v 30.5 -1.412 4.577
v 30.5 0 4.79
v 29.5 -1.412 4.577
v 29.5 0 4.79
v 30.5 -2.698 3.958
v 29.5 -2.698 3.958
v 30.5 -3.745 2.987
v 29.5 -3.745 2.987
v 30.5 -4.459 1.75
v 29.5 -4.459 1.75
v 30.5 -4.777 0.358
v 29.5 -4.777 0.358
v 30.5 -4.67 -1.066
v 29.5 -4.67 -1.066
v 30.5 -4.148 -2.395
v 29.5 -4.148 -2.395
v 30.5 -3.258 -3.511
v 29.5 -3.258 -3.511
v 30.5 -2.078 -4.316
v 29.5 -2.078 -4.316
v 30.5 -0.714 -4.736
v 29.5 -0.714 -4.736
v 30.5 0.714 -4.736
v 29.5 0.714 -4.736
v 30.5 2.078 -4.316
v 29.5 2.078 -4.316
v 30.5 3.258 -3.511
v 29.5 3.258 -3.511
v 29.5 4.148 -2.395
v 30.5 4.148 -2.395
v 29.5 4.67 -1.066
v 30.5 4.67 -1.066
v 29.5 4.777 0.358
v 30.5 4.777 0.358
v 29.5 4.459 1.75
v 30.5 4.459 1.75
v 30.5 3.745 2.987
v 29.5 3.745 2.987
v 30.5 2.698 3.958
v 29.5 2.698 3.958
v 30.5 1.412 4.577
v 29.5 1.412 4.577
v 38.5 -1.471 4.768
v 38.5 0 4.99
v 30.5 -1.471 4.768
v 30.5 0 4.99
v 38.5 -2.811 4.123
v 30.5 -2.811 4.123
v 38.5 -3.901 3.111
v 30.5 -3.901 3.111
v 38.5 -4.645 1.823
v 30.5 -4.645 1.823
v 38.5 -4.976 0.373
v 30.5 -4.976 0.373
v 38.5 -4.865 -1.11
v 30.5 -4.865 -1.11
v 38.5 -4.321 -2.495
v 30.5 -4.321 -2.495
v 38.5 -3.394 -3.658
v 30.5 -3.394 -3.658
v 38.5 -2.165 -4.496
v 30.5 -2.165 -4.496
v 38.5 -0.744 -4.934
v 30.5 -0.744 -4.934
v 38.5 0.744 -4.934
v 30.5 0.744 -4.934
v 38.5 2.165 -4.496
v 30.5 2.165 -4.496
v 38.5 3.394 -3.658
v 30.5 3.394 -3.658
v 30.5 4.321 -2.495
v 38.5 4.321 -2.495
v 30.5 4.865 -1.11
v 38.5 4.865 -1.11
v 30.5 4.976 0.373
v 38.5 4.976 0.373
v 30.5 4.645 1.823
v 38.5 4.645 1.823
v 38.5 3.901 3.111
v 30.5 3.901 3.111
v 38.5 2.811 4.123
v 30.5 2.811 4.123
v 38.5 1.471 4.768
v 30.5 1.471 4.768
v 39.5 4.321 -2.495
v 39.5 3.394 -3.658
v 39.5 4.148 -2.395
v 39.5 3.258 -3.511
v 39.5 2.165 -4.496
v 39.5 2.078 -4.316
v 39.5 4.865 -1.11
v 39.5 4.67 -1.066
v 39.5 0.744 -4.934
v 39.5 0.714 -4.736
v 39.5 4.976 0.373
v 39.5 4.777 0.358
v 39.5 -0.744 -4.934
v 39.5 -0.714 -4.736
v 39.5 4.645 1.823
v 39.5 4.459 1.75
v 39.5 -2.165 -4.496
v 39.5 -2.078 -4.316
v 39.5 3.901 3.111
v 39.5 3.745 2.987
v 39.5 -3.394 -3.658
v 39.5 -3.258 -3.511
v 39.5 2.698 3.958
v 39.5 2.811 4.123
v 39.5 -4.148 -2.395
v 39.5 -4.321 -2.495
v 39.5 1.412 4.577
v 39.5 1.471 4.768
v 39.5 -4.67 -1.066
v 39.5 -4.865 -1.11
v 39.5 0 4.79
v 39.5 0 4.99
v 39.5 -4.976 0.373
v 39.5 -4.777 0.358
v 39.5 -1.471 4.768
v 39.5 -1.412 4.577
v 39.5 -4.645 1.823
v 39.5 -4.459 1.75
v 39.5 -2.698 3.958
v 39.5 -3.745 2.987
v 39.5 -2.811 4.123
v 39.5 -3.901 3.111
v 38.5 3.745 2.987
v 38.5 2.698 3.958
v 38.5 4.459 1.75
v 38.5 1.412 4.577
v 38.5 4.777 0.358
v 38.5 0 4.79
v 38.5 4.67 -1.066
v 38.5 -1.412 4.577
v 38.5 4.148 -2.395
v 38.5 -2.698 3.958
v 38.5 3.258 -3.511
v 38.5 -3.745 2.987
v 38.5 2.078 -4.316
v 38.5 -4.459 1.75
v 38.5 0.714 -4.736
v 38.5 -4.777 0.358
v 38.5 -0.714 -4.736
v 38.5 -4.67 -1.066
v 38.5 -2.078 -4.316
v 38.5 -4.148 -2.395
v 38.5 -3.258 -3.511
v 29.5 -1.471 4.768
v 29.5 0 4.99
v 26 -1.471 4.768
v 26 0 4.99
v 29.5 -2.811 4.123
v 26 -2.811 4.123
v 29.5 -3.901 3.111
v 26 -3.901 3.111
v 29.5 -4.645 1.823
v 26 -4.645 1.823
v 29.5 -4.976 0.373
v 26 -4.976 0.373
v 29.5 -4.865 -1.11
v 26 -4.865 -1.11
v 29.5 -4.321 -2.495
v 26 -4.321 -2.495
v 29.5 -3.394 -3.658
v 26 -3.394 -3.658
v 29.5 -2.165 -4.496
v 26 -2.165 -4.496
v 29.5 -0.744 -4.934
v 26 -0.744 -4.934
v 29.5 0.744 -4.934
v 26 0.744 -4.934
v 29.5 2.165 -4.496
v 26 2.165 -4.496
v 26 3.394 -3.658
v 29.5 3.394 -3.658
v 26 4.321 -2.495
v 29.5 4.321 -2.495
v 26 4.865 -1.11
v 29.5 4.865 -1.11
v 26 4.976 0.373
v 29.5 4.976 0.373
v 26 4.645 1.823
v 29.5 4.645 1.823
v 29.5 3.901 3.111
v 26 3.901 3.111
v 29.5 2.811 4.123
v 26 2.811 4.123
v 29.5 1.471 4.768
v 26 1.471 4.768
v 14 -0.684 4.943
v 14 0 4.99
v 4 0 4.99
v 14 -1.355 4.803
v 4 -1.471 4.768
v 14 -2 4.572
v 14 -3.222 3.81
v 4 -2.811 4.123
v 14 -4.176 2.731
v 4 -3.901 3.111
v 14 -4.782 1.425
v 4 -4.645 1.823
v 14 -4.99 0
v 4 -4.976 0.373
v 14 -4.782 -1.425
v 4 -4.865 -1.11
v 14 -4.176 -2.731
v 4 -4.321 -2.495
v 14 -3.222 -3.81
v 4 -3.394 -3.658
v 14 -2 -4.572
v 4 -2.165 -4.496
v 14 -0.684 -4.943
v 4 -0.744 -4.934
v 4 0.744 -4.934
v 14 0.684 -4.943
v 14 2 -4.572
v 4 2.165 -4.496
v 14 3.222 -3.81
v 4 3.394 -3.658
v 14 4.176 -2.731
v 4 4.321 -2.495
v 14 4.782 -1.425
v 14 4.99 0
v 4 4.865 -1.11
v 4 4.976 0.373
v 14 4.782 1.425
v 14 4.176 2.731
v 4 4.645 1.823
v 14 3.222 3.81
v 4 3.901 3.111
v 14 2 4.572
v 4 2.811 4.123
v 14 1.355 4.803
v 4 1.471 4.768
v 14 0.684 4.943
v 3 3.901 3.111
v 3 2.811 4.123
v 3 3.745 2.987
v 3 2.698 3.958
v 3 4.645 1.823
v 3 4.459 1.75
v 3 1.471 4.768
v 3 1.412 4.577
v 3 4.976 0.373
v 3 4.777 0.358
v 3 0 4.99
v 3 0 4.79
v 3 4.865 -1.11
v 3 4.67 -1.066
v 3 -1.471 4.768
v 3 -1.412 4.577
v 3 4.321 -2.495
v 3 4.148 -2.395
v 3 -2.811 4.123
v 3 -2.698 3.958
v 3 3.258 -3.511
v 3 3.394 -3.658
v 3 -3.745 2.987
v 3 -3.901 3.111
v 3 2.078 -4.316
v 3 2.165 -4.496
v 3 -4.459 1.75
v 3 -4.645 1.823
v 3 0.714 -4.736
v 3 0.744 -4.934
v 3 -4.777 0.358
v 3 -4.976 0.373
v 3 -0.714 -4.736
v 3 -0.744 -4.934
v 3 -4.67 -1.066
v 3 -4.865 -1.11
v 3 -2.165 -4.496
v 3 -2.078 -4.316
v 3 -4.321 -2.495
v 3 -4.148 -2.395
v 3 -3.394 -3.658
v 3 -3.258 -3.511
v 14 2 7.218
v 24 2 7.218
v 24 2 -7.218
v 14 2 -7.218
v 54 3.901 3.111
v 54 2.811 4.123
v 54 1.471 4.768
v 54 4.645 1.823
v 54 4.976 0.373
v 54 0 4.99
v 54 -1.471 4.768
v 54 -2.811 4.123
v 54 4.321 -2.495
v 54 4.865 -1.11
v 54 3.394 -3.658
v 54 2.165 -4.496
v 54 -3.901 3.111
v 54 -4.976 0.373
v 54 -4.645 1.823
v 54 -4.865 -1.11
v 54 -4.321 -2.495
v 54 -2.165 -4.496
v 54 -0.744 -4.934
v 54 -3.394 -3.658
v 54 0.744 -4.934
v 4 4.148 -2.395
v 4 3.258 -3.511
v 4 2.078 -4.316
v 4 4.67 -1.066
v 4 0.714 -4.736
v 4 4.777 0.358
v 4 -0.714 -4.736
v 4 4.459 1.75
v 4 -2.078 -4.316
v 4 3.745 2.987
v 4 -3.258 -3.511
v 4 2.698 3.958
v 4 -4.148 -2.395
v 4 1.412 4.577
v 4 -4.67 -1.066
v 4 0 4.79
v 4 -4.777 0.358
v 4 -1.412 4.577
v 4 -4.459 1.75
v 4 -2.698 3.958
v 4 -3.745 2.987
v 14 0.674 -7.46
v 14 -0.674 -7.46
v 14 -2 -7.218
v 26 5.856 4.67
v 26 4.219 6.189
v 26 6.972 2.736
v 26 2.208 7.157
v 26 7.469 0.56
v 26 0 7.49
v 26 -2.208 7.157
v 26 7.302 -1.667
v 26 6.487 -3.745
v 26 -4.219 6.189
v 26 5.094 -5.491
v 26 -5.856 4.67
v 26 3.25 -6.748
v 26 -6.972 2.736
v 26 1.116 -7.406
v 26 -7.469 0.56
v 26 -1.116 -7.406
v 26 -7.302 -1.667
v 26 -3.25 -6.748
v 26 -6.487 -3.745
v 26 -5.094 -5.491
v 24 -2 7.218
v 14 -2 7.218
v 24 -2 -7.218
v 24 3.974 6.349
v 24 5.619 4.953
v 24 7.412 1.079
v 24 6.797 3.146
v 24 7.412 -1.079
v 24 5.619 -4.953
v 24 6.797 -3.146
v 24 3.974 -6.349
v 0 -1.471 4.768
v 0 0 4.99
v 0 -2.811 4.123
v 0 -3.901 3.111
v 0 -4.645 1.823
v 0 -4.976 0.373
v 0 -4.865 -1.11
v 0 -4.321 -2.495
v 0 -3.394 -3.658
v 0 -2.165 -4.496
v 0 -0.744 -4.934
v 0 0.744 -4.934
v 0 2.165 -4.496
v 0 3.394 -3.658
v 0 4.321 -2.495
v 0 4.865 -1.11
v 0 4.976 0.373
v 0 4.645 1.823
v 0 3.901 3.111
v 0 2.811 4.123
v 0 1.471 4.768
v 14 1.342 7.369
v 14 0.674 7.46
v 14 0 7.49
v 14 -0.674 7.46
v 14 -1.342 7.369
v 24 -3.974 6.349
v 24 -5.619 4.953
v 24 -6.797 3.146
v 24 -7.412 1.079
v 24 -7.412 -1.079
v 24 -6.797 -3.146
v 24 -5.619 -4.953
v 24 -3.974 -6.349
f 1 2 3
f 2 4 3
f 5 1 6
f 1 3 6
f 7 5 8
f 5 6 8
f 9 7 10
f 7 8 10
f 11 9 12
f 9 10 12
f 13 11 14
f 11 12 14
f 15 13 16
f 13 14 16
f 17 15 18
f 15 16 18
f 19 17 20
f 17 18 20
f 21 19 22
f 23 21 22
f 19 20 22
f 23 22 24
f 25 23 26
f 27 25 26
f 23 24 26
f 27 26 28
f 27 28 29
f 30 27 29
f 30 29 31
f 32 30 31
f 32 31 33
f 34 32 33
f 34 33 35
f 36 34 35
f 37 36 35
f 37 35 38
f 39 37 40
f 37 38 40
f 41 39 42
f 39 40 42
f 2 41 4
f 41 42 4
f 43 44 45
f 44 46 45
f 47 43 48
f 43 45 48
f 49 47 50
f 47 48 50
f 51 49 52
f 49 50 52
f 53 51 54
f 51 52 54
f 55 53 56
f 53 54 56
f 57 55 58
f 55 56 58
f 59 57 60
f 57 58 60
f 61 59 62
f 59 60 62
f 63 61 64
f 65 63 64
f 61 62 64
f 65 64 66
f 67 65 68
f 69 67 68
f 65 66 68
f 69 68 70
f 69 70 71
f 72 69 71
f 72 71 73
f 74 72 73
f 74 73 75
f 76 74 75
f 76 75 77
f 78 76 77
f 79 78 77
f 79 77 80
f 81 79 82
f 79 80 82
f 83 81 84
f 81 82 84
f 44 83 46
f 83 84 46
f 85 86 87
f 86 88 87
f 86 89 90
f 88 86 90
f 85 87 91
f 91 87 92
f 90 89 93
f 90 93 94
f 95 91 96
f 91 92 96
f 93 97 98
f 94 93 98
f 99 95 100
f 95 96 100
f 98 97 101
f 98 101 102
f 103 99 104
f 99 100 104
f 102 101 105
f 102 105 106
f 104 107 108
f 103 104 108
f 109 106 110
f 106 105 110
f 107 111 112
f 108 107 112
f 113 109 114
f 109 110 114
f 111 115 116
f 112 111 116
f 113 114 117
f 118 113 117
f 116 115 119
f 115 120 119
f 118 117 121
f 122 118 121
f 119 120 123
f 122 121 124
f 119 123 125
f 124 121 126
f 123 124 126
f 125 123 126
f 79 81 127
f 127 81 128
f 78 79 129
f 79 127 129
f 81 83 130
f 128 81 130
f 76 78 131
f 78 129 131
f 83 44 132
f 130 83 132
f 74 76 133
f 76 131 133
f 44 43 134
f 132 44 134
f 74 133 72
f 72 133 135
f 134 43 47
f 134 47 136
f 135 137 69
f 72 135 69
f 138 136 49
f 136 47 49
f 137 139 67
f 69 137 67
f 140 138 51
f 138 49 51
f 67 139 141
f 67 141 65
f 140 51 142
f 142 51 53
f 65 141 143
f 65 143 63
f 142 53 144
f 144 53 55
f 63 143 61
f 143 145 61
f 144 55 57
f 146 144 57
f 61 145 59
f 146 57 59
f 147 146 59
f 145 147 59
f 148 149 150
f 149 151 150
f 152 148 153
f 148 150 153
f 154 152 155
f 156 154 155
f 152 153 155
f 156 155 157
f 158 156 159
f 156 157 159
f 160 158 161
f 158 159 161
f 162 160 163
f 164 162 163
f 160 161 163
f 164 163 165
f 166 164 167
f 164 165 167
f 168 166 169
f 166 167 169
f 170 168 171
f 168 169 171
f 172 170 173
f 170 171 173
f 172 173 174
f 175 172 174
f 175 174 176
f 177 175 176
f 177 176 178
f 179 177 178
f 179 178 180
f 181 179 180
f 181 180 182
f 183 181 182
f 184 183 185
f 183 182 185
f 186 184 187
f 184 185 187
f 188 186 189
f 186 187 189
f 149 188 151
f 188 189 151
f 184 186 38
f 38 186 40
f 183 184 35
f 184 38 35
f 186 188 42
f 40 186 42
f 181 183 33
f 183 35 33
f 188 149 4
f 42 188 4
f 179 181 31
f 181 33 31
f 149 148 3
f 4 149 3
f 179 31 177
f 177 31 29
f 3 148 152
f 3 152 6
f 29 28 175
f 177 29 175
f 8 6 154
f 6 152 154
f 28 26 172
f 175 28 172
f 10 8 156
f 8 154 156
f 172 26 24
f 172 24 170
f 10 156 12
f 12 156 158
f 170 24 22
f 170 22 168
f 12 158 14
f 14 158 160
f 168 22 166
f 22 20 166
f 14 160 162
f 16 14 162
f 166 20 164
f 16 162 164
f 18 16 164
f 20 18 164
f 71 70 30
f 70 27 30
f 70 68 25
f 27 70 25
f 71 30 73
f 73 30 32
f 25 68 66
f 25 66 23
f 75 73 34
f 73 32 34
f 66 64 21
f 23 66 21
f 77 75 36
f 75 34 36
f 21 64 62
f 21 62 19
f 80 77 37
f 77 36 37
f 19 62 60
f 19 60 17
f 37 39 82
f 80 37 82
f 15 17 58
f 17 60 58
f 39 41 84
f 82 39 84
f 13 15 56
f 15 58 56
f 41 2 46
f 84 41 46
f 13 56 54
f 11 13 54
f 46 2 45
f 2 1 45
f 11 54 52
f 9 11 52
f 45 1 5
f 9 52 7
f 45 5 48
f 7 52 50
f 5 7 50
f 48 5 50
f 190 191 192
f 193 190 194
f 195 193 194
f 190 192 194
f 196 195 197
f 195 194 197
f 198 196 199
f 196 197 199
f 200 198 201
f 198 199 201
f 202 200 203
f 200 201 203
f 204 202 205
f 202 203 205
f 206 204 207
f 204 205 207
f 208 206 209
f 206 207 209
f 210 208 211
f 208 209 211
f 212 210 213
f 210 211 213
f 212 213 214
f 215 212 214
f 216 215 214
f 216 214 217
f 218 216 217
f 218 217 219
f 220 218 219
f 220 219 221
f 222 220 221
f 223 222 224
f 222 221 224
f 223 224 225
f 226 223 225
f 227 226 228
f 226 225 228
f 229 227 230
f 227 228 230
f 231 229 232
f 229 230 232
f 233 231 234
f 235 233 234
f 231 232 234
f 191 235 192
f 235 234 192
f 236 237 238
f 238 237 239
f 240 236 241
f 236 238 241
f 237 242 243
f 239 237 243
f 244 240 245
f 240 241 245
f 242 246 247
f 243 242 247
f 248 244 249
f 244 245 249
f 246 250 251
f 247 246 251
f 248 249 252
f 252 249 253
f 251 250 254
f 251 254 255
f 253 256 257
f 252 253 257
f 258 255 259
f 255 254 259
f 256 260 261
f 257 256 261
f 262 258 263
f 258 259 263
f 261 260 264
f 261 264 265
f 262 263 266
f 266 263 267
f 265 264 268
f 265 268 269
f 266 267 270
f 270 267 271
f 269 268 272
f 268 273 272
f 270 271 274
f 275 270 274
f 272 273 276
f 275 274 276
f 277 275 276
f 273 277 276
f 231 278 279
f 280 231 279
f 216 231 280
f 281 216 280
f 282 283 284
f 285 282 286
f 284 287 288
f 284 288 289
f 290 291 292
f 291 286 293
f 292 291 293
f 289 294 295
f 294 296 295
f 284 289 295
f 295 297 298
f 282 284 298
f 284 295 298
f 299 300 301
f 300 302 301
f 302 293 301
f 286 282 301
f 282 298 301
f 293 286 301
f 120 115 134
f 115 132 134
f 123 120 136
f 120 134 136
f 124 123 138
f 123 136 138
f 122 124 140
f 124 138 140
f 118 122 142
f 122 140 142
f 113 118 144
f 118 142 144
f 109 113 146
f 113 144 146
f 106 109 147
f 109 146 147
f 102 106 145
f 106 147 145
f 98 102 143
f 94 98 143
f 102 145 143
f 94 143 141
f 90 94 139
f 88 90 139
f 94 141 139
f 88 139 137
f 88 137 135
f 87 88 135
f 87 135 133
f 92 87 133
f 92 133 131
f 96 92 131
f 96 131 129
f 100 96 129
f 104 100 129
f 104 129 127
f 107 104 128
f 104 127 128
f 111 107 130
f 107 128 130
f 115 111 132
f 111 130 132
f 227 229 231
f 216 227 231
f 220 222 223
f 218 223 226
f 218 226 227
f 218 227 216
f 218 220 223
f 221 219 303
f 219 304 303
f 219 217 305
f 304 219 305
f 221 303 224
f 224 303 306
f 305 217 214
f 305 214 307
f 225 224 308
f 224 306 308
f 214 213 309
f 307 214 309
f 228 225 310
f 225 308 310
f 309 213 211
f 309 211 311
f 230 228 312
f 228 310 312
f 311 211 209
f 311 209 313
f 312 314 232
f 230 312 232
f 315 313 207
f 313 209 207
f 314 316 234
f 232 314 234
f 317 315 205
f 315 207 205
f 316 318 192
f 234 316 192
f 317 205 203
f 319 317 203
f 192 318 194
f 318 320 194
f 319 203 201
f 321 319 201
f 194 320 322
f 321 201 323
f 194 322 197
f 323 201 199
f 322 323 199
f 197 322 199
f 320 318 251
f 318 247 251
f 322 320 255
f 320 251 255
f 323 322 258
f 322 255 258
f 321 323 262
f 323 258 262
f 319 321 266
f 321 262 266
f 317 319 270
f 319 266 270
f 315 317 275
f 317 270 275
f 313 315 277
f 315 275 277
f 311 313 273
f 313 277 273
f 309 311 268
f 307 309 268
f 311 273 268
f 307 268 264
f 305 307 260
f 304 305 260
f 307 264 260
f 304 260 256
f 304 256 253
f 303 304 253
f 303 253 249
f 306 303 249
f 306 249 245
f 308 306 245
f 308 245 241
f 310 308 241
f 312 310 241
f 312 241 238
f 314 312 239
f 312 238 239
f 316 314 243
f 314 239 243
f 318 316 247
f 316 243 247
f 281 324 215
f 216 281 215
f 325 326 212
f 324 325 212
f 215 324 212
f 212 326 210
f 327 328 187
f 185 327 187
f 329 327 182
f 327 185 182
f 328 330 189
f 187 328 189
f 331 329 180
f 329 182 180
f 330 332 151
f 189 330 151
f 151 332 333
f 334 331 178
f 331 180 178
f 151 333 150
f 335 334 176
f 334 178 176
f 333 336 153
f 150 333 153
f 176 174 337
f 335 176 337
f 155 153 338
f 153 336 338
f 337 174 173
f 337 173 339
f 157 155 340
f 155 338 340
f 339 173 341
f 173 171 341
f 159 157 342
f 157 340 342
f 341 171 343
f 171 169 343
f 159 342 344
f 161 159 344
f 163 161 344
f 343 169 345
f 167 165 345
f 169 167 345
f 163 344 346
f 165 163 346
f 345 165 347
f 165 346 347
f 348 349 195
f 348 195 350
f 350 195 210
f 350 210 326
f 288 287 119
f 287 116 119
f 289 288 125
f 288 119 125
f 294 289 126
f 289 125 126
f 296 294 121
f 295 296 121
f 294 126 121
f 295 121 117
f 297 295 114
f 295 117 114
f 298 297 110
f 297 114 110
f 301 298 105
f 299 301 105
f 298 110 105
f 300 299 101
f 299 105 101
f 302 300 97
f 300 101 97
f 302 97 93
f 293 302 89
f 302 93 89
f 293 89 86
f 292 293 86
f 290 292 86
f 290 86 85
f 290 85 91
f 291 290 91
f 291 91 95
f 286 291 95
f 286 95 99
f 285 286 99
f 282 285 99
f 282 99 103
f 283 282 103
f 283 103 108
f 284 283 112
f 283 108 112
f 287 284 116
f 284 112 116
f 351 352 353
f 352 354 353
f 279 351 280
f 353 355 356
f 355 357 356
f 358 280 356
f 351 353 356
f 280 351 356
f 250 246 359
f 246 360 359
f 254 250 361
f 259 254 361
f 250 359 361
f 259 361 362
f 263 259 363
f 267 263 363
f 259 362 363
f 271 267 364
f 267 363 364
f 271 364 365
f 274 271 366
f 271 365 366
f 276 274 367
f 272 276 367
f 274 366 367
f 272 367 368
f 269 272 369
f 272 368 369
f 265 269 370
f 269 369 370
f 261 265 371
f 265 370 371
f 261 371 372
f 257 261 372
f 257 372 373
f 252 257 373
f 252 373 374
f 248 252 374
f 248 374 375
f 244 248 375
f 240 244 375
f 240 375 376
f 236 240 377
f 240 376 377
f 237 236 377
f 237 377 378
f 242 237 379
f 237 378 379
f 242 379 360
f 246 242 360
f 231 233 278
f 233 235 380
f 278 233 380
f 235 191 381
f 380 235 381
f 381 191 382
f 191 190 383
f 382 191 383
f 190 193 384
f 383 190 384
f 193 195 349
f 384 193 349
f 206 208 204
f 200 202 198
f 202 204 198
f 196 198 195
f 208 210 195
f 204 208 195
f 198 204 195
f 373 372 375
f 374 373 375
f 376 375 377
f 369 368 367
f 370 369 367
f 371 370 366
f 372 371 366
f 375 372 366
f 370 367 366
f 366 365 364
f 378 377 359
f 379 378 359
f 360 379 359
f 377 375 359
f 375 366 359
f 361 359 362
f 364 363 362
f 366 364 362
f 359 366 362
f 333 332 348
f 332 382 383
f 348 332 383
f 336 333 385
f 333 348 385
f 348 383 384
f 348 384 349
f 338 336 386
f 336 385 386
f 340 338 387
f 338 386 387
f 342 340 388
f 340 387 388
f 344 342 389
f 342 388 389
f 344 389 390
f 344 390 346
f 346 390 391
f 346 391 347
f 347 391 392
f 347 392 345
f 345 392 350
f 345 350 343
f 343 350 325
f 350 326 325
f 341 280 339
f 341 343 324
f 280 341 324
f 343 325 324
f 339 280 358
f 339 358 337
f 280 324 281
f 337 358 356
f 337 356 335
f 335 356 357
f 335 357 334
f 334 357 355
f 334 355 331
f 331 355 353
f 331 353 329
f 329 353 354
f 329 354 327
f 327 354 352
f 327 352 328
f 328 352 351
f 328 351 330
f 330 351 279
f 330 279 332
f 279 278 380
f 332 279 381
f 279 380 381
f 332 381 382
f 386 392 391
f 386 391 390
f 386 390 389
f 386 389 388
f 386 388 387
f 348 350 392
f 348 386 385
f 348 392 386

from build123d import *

# Parameters (mm, degrees)
CUT_EXTRUDE8_DEPTH = 10


with BuildPart() as part:
    # Sketch3 → Revolve1 (revolve)
    with BuildSketch(Plane(origin=(0, 0, 0), x_dir=(1, 0, 0), z_dir=(0, 1, 0)), mode=Mode.PRIVATE) as revolve1_sk:
        Polygon((0, 0), (54, 0), (54, 4.99), (39.5, 4.99), (39.5, 4.79), (38.5, 4.79), (38.5, 4.99), (30.5, 4.99), (30.5, 4.79), (29.5, 4.79), (29.5, 4.99), (26, 4.99), (26, 7.49), (14, 7.49), (14, 4.99), (4, 4.99), (4, 4.79), (3, 4.79), (3, 4.99), (0, 4.99), align=None)
    revolve(revolve1_sk.sketch.rotate(Axis((0, 0, 0), (1, 0, 0)), 180), axis=Axis((0, 0, 0), (1, 0, 0)))

    # Sketch10 → Cut-Extrude8 (cut)
    with BuildSketch(Plane.ZY.offset(-14)):
        with BuildLine():
            Line((7.228416147, 2), (-7.228416147, 2))
            ThreePointArc((-7.228416147, 2), (0, 7.5), (7.228416147, 2))
        make_face()
        with BuildLine():
            Line((7.228416147, -2), (-7.228416147, -2))
            ThreePointArc((-7.228416147, -2), (0, -7.5), (7.228416147, -2))
        make_face()
    extrude(amount=-CUT_EXTRUDE8_DEPTH, mode=Mode.SUBTRACT)


solid = part.part
